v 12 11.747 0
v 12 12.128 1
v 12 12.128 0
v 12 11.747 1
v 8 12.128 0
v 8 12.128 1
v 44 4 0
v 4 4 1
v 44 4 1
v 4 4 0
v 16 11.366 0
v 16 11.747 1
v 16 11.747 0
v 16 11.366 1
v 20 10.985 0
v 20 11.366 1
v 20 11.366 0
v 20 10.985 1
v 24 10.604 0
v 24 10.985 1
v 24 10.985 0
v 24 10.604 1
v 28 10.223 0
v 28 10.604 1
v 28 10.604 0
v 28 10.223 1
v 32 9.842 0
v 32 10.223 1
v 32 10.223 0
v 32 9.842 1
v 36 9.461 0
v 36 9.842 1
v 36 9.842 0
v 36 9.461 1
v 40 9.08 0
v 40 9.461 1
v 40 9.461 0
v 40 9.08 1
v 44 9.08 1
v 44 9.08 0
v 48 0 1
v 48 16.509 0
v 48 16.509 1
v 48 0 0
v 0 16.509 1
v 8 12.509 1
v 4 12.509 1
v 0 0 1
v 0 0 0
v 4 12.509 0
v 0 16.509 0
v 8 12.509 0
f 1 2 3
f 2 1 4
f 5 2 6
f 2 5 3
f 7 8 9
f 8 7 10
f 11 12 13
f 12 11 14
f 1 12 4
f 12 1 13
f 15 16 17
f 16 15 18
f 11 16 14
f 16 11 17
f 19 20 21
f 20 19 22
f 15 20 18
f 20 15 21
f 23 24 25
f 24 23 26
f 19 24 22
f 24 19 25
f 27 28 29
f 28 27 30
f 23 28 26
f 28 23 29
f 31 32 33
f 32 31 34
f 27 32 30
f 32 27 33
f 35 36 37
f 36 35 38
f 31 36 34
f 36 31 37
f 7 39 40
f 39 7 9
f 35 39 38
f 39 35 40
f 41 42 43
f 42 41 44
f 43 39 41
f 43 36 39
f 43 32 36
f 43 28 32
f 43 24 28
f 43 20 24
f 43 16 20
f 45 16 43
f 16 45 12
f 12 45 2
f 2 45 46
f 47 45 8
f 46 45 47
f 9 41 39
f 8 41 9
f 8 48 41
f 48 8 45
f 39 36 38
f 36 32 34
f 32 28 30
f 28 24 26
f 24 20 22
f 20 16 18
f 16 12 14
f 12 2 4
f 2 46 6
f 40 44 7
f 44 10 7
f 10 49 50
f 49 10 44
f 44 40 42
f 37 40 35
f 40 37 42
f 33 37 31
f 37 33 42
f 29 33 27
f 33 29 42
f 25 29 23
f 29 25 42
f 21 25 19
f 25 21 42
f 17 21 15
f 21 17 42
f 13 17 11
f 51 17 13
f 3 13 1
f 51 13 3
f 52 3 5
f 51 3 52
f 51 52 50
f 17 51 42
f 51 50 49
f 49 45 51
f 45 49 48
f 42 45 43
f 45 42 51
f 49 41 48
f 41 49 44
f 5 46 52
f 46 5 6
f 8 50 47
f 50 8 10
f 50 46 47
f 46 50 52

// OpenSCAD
module decoder(name, depth_table, wardingHeight=8, doubleSided=false){
    numOfDepths = len(depth_table);
    maxDepth = max(depth_table);
    thickness=1;
    spacePerDepth=4;
    union(){
    difference()
    {
        cube([(numOfDepths+2)*spacePerDepth,maxDepth+2*spacePerDepth,thickness]);
        translate([(1)*spacePerDepth,spacePerDepth,-1]){
            cube([spacePerDepth,depth_table[0],thickness+2]);
        }
        for(i=[1:numOfDepths-1]){
            translate([(1+i)*spacePerDepth-0.1,spacePerDepth,-1]){
                if(doubleSided){
                  cube([spacePerDepth+0.1,2*depth_table[i]-wardingHeight,thickness+2]);  
                 }else{
                 cube([spacePerDepth+0.1,depth_table[i],thickness+2]);
                }
            }
        }
    }
       for(i=[0:numOfDepths-1]){
            translate([(1.5+i)*spacePerDepth,depth_table[i]+(spacePerDepth*1.25),thickness]){
                text(str(i), font="Liberation Sans", size=spacePerDepth/2, halign="center");
            }
        }
       translate([((numOfDepths+2)*spacePerDepth)/2,spacePerDepth*0.25,thickness]){
           text(name,font="Liberation Sans", size=spacePerDepth/2,halign="center");
           } 

    }
    
}
name = "Schlage Classic";
depth_table = [for(i=[0.335:-0.015:0.199]) i*25.4];
decoder(name, depth_table);
   
    
